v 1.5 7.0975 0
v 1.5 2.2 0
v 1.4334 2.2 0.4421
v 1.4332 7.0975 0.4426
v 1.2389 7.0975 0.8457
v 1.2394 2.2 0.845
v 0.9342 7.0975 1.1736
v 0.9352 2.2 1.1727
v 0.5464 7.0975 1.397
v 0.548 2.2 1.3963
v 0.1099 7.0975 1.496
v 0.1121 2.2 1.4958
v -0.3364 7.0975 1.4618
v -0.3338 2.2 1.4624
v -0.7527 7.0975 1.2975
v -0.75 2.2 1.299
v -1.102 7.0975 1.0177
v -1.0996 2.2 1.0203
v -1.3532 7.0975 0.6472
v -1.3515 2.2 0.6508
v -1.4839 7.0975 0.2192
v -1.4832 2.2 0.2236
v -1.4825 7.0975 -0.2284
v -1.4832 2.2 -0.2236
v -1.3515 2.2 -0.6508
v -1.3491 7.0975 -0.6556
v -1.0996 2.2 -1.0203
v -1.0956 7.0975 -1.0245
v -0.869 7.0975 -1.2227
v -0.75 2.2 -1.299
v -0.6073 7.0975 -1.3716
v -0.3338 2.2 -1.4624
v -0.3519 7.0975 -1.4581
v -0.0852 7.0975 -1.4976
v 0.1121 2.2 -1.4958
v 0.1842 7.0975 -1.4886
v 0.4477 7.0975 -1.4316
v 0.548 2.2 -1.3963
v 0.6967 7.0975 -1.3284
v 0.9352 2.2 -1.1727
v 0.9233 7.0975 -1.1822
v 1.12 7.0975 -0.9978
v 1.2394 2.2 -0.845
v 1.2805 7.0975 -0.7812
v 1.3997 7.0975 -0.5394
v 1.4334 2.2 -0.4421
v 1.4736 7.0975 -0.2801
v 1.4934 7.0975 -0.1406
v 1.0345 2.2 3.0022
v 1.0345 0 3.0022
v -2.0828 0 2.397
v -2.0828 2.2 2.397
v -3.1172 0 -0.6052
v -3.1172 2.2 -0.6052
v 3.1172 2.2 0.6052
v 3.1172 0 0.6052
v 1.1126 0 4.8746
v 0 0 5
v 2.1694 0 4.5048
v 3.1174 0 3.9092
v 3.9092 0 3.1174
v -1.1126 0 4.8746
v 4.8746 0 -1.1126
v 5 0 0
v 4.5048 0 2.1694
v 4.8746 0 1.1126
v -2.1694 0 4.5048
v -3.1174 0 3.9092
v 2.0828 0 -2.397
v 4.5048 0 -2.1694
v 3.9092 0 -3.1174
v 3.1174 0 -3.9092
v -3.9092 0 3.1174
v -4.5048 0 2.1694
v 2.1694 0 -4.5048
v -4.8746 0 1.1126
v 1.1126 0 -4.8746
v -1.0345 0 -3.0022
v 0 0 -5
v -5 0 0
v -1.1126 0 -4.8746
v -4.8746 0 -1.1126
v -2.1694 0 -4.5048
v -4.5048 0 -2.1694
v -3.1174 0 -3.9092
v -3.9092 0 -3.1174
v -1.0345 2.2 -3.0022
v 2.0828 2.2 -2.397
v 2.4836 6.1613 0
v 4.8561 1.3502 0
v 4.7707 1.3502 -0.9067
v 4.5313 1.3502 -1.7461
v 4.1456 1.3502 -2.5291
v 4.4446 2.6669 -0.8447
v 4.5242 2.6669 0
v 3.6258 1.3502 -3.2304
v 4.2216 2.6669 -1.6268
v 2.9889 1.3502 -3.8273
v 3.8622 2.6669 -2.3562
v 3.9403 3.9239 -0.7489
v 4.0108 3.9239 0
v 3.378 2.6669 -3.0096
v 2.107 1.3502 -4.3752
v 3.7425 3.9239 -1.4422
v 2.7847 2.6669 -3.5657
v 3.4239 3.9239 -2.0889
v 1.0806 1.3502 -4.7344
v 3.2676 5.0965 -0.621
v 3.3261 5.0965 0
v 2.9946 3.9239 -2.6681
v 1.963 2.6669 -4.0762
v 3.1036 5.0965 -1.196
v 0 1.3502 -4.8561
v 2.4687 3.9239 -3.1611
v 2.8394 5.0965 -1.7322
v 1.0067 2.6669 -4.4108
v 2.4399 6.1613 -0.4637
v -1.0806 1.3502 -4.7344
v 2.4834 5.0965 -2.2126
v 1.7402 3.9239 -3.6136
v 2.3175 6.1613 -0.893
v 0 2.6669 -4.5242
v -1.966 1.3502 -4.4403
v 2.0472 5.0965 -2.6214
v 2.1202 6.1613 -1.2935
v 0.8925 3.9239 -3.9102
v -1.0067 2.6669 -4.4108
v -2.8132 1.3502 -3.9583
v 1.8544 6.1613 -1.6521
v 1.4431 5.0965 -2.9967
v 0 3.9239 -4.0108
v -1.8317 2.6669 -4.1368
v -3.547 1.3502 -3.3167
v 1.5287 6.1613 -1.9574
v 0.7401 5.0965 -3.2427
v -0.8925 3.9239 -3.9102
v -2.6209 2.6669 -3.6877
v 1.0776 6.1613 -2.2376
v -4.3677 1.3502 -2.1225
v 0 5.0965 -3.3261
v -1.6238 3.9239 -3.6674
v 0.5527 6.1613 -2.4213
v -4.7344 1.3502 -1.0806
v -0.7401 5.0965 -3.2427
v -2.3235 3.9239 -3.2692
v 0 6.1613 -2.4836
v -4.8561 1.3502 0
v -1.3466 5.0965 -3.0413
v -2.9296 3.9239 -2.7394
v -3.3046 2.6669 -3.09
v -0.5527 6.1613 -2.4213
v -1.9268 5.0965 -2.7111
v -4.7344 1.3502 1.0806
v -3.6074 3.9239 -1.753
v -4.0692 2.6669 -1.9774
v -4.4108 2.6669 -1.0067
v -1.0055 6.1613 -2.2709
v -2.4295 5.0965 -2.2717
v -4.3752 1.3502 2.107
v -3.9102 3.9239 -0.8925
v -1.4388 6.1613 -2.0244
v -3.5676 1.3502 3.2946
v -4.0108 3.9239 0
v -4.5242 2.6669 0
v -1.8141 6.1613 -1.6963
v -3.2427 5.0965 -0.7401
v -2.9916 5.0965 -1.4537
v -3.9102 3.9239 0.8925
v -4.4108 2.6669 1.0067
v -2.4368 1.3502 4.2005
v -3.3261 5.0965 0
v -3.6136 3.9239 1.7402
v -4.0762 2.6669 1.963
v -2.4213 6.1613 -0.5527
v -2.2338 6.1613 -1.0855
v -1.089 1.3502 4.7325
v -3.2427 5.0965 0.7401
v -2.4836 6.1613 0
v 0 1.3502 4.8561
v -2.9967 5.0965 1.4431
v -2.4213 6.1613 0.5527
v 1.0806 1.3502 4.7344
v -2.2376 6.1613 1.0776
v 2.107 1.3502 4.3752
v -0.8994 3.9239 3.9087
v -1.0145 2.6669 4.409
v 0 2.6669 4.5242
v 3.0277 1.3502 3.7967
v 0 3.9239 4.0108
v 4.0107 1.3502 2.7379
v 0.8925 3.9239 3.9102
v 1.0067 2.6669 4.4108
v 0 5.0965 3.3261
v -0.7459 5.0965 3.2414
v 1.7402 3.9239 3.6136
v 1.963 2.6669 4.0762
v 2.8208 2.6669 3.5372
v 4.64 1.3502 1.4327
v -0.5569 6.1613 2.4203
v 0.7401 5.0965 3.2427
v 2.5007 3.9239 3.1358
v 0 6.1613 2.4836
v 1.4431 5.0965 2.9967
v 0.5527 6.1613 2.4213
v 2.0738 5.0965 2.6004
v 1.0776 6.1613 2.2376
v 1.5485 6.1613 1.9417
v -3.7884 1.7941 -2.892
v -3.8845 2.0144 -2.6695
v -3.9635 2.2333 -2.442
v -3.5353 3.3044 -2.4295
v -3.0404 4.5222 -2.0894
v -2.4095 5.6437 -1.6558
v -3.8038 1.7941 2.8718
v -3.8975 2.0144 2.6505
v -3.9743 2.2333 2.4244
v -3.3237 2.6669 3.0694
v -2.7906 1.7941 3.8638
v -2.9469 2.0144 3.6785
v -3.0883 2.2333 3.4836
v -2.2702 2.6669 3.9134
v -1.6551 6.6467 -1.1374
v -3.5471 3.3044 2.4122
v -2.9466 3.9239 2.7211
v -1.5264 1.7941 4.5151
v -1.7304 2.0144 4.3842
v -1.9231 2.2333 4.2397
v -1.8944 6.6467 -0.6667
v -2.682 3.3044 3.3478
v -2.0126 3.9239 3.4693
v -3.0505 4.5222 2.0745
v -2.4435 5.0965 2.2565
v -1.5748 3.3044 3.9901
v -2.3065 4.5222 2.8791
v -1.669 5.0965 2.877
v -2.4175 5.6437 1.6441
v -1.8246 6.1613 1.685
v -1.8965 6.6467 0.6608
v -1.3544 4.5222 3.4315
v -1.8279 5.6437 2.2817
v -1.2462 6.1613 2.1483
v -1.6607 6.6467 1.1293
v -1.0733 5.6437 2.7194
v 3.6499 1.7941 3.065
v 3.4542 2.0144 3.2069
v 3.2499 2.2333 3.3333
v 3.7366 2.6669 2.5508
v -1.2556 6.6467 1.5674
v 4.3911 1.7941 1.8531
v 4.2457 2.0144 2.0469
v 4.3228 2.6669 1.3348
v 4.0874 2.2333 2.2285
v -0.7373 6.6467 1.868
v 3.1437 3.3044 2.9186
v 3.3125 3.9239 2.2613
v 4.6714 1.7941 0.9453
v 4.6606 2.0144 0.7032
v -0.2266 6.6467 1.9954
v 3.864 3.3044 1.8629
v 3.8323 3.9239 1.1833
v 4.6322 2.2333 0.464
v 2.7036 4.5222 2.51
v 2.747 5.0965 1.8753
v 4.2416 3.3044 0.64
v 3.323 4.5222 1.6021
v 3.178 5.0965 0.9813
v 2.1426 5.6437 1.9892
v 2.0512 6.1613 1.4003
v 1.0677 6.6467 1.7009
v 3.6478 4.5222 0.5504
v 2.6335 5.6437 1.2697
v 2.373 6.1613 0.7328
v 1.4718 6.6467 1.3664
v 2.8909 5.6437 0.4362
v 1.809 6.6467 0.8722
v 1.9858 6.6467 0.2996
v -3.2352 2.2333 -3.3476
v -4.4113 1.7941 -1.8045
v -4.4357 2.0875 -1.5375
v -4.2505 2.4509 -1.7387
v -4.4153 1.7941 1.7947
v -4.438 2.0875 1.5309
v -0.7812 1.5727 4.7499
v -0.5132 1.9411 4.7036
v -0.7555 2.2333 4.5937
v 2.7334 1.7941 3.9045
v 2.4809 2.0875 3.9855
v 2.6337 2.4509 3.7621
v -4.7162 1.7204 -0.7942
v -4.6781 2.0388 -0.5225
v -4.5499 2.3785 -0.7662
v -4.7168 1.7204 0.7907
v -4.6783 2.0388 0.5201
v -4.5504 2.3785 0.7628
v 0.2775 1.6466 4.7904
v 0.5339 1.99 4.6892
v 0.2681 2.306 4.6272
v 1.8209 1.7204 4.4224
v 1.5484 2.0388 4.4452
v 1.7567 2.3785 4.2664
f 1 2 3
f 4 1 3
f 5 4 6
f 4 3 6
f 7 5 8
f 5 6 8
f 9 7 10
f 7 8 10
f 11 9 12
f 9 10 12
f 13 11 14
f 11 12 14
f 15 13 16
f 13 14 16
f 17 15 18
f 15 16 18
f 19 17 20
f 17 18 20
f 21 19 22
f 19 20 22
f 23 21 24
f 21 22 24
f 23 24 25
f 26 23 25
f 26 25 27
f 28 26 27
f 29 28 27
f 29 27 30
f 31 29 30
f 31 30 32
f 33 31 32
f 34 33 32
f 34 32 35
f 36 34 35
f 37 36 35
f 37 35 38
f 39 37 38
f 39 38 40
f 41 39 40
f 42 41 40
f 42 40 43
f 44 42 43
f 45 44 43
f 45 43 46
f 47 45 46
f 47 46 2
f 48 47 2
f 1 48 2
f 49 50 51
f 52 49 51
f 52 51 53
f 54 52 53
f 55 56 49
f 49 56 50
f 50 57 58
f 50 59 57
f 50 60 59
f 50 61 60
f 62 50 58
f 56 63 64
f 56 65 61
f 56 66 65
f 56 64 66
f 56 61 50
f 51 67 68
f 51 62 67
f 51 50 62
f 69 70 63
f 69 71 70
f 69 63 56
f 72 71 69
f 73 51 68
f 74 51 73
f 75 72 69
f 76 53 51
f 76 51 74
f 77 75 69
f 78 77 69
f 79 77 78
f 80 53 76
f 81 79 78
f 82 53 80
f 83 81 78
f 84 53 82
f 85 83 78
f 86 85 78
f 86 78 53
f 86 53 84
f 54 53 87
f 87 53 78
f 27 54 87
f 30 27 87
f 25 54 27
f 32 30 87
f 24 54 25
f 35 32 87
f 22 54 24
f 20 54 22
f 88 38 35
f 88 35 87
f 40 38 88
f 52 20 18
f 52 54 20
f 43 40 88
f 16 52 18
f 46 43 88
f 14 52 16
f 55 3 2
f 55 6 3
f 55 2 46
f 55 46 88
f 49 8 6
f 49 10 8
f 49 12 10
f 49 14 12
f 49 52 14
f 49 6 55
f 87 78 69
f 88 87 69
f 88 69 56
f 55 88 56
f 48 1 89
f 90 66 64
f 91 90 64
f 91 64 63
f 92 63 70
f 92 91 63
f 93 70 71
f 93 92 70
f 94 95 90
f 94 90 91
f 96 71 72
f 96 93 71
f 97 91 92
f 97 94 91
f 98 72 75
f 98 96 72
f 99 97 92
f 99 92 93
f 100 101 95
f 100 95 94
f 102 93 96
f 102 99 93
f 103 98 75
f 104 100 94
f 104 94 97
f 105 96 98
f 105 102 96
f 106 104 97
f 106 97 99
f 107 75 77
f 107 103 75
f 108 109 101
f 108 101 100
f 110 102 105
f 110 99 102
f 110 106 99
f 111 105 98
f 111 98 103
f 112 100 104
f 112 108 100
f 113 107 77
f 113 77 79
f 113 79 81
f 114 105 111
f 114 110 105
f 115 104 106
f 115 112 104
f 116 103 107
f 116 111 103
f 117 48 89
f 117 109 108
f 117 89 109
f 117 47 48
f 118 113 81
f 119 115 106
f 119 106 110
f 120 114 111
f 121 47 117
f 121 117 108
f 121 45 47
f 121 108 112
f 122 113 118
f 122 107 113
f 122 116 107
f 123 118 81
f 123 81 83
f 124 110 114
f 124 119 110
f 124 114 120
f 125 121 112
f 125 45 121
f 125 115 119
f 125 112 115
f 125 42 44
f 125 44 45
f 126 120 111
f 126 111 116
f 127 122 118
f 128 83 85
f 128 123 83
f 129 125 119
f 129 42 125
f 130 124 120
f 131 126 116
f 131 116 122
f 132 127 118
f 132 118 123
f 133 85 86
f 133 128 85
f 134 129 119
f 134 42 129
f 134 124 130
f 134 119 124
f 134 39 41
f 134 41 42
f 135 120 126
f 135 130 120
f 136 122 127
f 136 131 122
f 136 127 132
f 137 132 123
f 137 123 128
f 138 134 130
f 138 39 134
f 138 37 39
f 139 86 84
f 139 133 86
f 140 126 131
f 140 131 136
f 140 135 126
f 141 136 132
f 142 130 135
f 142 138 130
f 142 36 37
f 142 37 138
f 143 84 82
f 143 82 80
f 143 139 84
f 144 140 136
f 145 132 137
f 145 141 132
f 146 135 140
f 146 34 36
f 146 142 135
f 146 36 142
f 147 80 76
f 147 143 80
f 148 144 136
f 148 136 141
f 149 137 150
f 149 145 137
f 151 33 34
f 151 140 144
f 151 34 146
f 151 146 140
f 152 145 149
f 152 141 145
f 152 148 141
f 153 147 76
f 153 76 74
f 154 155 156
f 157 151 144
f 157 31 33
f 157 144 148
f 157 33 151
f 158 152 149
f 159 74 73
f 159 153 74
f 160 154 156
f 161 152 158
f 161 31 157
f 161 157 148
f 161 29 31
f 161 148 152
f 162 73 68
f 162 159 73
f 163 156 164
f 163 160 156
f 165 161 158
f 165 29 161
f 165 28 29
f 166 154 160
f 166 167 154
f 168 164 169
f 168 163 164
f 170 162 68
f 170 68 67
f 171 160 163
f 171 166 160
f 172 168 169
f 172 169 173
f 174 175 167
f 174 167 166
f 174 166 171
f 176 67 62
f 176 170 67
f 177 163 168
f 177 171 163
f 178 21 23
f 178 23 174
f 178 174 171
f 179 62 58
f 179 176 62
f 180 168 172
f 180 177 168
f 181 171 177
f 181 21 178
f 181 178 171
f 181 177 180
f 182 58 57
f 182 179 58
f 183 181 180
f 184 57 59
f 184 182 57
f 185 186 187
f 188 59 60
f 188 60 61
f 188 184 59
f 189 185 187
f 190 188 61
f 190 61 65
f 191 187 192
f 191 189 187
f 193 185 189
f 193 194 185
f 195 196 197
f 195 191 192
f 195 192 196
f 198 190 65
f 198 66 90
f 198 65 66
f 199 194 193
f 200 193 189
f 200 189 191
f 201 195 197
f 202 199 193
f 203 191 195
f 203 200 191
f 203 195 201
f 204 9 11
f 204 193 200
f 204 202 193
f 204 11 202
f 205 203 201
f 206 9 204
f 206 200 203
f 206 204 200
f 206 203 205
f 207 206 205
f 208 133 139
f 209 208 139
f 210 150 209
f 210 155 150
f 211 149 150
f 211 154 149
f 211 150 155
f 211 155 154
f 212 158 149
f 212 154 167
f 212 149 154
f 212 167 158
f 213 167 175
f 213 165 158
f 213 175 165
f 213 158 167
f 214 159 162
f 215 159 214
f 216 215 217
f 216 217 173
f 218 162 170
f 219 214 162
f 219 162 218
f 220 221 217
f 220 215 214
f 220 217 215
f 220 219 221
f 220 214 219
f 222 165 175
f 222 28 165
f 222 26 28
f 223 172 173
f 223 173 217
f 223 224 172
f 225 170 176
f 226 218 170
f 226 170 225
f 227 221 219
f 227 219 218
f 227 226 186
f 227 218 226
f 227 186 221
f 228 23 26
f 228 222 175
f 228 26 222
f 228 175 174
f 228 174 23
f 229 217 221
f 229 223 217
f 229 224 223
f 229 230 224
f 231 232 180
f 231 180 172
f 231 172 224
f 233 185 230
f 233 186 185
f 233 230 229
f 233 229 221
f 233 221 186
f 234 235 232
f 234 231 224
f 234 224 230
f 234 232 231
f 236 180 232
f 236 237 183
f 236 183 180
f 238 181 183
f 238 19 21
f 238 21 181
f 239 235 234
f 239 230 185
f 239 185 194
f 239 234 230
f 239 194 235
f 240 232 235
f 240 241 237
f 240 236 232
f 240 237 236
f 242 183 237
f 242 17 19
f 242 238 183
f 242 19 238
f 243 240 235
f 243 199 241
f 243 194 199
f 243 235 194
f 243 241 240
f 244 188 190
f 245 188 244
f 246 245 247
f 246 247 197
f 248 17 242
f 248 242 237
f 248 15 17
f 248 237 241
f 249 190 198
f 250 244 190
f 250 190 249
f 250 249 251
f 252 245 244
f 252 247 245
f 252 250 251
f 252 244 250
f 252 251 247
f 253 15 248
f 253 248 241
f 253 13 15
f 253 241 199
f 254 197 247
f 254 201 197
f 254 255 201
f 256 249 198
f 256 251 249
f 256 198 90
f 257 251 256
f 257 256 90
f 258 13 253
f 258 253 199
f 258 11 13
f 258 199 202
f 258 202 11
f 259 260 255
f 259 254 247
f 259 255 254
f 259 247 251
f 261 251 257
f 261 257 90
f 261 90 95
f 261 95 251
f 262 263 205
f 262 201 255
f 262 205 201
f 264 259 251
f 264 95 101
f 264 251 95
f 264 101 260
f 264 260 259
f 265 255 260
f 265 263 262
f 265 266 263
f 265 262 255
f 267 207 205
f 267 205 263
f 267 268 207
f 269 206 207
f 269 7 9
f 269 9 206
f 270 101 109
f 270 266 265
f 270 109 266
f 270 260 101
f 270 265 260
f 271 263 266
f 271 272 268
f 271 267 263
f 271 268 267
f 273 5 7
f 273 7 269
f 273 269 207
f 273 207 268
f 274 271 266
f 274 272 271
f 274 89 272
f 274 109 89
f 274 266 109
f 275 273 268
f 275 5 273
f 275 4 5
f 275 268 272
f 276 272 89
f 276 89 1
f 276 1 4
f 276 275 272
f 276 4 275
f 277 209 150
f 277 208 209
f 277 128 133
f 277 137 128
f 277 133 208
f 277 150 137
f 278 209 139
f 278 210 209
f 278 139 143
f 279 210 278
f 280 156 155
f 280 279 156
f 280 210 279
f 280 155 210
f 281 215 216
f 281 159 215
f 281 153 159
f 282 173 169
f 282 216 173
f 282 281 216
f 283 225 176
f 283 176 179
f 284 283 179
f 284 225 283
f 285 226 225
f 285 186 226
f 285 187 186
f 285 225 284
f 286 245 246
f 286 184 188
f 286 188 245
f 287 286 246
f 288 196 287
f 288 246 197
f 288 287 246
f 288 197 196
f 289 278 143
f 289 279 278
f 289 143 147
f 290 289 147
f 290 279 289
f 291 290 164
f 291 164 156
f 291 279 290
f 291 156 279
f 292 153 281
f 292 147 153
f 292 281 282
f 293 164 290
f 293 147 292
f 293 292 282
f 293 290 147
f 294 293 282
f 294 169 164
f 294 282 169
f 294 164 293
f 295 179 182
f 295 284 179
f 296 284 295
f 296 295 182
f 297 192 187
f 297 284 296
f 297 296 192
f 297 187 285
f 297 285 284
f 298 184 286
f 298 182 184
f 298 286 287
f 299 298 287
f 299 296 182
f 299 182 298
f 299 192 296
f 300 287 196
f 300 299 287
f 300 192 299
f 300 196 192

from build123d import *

# Parameters (mm, degrees)
F2_R     = 1.5
F3_DEPTH = 25
F4_DEPTH = 2.2


with BuildPart() as f1:
    # F0 (on Top) → F1 (revolve)
    with BuildSketch(Plane.XY):
        with BuildLine():
            Line((0, 8.115384), (0, 0))
            Line((0, 0), (5, 0))
            ThreePointArc((5, 0), (3.571673, 4.717964), (0, 8.115384))
        make_face()
    revolve(axis=Axis((0, 4.057692, 0), (0, 1, 0)))

    # F2 (on face) → F3 (cut)
    with BuildSketch(Plane.XZ):
        Circle(F2_R)
    extrude(amount=-F3_DEPTH, mode=Mode.SUBTRACT)

    # F2 (on face) → F4 (cut)
    with BuildSketch(Plane.XZ):
        Polygon((3.117215, 0.605232), (1.034461, 3.002203), (-2.082754, 2.396971), (-3.117215, -0.605232), (-1.034461, -3.002203), (2.082754, -2.396971), align=None)
        Circle(F2_R, mode=Mode.SUBTRACT)
    extrude(amount=-F4_DEPTH, mode=Mode.SUBTRACT)


solid = f1.part
